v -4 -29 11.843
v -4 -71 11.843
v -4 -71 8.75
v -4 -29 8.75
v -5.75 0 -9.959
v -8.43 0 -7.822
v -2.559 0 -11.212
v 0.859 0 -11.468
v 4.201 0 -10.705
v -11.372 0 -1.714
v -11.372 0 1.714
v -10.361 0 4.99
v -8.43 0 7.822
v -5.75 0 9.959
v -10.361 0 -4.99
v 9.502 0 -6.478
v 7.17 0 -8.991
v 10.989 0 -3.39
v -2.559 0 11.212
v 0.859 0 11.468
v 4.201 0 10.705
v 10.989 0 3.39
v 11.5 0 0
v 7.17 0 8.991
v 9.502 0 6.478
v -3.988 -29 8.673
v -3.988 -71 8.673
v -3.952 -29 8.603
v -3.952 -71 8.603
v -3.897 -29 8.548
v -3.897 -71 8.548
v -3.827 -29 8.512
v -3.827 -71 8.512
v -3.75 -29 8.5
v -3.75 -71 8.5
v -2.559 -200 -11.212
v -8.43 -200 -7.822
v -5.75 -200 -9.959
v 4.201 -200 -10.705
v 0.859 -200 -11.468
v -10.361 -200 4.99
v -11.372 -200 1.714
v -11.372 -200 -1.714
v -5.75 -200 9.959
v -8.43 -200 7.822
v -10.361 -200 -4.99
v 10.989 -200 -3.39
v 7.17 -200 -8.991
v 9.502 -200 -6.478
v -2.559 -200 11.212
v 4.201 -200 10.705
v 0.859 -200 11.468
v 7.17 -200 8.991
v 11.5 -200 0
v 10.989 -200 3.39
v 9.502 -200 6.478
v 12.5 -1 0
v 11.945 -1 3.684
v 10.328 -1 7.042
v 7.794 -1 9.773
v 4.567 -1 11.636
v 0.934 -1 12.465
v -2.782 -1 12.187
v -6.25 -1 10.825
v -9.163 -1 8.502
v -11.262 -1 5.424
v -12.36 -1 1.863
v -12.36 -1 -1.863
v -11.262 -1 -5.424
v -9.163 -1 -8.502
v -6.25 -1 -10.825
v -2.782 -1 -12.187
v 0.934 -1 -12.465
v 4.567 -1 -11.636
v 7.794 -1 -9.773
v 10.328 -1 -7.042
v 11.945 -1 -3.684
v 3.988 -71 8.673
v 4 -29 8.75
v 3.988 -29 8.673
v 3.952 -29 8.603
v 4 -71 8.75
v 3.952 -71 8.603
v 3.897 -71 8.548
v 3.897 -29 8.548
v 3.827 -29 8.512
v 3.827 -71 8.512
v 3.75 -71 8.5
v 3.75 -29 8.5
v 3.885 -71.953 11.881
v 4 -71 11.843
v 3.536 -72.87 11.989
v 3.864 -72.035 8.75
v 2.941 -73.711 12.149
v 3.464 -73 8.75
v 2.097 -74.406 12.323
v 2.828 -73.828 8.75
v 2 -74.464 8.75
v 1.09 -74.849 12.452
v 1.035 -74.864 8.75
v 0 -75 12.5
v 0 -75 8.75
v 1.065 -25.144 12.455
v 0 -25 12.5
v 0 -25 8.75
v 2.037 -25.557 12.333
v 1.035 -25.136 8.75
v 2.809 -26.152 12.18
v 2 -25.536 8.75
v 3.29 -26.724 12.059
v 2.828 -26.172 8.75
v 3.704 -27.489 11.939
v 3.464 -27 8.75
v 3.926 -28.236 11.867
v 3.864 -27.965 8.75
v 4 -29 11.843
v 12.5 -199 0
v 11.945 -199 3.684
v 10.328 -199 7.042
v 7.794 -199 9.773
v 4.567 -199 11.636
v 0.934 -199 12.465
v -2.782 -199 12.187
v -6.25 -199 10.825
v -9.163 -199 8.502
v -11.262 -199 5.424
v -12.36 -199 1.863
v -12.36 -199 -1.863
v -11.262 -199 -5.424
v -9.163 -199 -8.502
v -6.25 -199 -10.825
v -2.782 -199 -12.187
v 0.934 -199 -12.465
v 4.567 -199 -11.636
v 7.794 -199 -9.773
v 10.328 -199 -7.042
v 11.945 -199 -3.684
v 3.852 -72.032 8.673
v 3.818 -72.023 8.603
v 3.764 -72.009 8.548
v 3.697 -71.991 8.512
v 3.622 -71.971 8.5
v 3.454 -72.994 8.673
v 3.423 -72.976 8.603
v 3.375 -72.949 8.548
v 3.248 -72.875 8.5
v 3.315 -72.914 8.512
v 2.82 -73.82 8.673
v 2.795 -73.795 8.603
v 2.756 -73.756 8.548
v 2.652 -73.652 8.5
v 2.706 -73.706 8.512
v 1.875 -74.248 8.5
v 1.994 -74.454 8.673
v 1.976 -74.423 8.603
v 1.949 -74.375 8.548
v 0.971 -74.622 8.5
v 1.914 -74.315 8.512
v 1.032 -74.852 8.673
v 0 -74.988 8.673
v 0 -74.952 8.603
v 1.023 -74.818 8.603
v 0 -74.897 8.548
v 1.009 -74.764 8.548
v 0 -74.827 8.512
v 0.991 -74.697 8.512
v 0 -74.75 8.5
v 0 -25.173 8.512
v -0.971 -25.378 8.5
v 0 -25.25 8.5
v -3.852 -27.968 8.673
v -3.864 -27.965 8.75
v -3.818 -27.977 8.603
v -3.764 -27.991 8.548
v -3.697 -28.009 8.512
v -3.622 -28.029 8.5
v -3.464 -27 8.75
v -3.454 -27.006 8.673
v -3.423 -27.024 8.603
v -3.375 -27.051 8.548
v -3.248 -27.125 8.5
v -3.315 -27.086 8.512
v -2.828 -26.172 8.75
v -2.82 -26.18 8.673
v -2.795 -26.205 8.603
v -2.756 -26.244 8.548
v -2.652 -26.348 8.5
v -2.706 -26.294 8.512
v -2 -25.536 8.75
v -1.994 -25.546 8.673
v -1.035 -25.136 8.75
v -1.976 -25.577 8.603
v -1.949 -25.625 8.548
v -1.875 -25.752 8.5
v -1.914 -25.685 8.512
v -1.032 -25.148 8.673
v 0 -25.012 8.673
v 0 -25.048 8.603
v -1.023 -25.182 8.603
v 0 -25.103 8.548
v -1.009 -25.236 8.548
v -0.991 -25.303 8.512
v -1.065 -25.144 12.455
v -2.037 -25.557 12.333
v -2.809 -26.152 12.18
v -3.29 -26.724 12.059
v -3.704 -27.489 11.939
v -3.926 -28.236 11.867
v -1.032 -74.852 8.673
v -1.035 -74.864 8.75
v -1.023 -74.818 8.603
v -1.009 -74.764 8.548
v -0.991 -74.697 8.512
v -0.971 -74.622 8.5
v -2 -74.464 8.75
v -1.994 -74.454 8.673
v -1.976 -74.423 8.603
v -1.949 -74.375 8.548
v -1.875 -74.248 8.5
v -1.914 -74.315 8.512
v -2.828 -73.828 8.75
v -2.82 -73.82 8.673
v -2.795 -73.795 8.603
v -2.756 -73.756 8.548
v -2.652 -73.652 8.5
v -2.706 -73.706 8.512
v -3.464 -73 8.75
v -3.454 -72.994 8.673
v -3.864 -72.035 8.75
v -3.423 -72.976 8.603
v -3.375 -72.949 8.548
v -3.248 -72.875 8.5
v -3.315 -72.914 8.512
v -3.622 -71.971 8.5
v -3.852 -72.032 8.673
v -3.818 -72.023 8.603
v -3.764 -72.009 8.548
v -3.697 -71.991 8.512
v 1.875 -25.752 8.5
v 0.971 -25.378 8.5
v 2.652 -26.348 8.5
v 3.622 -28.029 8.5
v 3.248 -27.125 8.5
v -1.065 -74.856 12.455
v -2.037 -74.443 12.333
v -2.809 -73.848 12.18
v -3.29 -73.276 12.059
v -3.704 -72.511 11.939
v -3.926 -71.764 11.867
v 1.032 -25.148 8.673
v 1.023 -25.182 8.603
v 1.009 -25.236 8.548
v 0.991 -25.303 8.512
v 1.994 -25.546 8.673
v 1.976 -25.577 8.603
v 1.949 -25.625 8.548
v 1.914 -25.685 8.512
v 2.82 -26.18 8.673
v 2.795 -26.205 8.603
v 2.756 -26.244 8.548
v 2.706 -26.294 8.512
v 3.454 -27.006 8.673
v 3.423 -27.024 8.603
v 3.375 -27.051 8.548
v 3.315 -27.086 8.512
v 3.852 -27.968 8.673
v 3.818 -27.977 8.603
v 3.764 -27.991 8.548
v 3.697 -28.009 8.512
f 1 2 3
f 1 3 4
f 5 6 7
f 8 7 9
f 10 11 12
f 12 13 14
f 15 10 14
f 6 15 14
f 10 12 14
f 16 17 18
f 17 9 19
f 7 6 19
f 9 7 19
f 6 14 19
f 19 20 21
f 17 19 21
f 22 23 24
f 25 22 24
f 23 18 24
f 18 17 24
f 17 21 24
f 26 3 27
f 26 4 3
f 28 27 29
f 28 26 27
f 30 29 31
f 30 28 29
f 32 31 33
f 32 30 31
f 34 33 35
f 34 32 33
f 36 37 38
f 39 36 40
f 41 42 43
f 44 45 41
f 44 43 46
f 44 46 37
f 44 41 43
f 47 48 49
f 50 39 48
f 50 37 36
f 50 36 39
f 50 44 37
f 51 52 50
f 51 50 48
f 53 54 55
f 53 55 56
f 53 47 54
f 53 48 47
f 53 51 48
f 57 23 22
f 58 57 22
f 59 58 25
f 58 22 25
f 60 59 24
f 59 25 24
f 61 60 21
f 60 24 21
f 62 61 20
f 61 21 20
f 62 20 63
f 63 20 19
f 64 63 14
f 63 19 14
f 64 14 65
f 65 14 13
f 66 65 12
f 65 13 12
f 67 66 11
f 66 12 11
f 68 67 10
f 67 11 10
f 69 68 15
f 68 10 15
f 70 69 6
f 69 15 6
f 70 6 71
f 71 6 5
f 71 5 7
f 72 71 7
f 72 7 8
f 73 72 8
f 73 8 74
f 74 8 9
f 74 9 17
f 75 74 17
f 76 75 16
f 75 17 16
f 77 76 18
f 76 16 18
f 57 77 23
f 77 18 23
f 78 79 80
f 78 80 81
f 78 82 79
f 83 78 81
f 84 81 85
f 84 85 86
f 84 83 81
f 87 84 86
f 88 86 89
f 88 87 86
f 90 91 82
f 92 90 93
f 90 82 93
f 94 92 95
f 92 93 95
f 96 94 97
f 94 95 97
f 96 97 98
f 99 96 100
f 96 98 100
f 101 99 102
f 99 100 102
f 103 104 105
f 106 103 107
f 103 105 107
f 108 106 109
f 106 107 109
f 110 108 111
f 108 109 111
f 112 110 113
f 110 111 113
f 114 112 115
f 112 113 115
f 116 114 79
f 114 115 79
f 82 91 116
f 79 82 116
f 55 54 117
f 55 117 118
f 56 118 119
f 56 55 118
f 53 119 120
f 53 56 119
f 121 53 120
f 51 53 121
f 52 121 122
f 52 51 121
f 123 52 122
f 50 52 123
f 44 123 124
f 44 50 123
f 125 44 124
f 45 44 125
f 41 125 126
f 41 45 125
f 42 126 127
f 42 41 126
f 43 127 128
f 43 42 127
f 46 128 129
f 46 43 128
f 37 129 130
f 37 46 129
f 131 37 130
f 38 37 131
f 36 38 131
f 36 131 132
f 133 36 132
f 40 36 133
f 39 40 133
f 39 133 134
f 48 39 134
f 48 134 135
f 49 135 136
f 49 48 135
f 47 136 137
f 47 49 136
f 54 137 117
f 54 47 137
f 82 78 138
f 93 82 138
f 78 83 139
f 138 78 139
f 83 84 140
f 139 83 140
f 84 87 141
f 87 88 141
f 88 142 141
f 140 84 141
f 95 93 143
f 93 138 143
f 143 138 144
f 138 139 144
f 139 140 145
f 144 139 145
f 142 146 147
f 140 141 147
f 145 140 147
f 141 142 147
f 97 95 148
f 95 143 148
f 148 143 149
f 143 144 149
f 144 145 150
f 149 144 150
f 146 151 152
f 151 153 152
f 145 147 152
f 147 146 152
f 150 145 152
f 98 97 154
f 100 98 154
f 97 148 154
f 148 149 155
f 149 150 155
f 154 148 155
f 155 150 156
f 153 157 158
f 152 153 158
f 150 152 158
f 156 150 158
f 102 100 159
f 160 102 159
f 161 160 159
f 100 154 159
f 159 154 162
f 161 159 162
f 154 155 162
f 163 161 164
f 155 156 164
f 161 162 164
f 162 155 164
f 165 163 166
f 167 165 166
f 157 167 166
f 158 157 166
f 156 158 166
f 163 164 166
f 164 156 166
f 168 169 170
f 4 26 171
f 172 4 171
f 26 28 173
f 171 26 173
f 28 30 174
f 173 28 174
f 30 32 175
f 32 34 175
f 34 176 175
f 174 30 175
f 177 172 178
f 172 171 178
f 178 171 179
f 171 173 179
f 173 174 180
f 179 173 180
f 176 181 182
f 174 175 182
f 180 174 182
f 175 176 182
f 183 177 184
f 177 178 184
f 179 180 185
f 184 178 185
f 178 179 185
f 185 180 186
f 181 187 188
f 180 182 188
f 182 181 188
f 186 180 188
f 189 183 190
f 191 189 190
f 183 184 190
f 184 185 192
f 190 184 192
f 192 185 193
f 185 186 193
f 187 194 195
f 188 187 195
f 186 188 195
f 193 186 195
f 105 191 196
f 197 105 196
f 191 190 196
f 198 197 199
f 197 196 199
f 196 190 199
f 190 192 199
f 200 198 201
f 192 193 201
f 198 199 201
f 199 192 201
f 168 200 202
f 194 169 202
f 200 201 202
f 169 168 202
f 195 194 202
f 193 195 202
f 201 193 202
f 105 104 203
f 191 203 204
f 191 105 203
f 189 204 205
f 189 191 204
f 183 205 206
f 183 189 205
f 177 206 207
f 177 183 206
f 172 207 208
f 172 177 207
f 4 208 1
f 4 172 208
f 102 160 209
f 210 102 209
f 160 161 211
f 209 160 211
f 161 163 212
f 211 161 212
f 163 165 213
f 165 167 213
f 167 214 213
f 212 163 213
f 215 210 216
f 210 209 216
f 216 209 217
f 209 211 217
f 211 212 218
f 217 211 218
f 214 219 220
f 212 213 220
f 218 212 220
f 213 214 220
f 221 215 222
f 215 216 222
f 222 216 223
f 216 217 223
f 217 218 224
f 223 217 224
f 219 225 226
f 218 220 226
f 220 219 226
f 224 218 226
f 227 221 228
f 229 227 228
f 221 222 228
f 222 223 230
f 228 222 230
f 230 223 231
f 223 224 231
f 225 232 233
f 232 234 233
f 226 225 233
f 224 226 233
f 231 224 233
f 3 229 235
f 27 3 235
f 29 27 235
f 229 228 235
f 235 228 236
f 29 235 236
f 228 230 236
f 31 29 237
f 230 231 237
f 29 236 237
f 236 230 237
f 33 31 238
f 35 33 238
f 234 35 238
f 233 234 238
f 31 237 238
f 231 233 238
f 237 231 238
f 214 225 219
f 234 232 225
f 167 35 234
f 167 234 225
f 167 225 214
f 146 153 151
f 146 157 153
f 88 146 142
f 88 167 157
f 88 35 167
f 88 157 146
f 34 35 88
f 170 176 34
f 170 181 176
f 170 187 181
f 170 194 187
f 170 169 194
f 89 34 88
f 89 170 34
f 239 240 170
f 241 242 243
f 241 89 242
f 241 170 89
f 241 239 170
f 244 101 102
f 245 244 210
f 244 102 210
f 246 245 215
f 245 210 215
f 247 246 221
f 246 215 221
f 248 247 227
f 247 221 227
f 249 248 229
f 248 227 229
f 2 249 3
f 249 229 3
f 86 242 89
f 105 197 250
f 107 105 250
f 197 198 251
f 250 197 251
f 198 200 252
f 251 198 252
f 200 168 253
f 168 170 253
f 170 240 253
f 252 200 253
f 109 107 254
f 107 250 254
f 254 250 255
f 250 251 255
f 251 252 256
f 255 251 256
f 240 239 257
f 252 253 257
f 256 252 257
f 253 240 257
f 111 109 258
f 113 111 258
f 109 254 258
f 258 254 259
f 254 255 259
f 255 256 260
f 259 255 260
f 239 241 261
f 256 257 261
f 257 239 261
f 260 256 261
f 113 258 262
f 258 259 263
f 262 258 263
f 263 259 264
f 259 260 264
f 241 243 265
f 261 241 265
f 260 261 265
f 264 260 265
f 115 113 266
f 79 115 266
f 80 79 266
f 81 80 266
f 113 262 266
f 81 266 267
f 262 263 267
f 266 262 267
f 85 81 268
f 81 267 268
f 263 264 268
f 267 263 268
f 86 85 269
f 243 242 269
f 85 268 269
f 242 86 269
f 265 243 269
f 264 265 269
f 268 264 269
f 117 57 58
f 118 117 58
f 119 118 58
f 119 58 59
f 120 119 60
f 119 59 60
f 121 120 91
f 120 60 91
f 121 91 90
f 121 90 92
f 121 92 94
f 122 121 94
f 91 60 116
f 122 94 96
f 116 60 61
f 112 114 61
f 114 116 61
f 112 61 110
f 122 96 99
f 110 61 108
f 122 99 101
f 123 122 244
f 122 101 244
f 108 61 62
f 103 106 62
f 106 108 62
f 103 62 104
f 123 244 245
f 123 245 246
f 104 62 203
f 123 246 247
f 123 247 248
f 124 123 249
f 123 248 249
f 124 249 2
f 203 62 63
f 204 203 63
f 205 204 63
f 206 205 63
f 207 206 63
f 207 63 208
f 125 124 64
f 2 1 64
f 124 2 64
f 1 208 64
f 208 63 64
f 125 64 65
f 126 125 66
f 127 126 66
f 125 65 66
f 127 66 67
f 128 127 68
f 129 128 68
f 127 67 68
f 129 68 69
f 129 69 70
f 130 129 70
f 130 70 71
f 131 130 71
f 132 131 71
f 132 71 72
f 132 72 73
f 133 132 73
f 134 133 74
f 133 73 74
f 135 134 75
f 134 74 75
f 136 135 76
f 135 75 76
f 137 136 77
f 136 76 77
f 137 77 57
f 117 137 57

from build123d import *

# Parameters (mm, degrees)
F0_R     = 12.5
F1_DEPTH = 200
F3_W     = 8
F3_H     = 50
F4_DEPTH = 4
F5_R     = 3.9999
F6_R     = 0.25
F7_SIZE  = 1


# Not quite as in the source:
# - a fillet or chamfer is up to 0.001 mm smaller than in the source, because OpenCascade refuses the exact size


with BuildPart() as f1:
    # F0 (on Front) → F1 (new body)
    with BuildSketch(Plane.XZ):
        Circle(F0_R)
    extrude(amount=F1_DEPTH)

    # F3 (on offset) → F4 (cut)
    with BuildSketch(Plane.XY.offset(12.5)):
        with Locations((0, -50)):
            Rectangle(F3_W, F3_H)
    extrude(amount=-F4_DEPTH, mode=Mode.SUBTRACT)

    # F5 (radius 4 in the source; OpenCascade refuses exactly that, so slightly less here)
    f5_edges = [f1.edges().sort_by_distance(p)[0] for p in [
        (-4, -25, 10.17136),
        (4, -25, 10.17136),
        (4, -75, 10.17136),
        (-4, -75, 10.17136),
    ]]
    fillet(f5_edges, radius=F5_R)

    # F6
    f6_edges = [f1.edges().sort_by_distance(p)[0] for p in [
        (0, -25, 8.5),
        (2.828456, -26.171544, 8.5),
        (-2.828456, -26.171544, 8.5),
        (4, -50, 8.5),
        (-4, -50, 8.5),
        (2.828456, -73.828456, 8.5),
        (-2.828456, -73.828456, 8.5),
        (0, -75, 8.5),
    ]]
    fillet(f6_edges, radius=F6_R)

    # F7
    f7_edges = [f1.edges().sort_by_distance(p)[0] for p in [
        (-12.5, -200, 0),
        (-12.5, 0, 0),
    ]]
    chamfer(f7_edges, length=F7_SIZE)


solid = f1.part
